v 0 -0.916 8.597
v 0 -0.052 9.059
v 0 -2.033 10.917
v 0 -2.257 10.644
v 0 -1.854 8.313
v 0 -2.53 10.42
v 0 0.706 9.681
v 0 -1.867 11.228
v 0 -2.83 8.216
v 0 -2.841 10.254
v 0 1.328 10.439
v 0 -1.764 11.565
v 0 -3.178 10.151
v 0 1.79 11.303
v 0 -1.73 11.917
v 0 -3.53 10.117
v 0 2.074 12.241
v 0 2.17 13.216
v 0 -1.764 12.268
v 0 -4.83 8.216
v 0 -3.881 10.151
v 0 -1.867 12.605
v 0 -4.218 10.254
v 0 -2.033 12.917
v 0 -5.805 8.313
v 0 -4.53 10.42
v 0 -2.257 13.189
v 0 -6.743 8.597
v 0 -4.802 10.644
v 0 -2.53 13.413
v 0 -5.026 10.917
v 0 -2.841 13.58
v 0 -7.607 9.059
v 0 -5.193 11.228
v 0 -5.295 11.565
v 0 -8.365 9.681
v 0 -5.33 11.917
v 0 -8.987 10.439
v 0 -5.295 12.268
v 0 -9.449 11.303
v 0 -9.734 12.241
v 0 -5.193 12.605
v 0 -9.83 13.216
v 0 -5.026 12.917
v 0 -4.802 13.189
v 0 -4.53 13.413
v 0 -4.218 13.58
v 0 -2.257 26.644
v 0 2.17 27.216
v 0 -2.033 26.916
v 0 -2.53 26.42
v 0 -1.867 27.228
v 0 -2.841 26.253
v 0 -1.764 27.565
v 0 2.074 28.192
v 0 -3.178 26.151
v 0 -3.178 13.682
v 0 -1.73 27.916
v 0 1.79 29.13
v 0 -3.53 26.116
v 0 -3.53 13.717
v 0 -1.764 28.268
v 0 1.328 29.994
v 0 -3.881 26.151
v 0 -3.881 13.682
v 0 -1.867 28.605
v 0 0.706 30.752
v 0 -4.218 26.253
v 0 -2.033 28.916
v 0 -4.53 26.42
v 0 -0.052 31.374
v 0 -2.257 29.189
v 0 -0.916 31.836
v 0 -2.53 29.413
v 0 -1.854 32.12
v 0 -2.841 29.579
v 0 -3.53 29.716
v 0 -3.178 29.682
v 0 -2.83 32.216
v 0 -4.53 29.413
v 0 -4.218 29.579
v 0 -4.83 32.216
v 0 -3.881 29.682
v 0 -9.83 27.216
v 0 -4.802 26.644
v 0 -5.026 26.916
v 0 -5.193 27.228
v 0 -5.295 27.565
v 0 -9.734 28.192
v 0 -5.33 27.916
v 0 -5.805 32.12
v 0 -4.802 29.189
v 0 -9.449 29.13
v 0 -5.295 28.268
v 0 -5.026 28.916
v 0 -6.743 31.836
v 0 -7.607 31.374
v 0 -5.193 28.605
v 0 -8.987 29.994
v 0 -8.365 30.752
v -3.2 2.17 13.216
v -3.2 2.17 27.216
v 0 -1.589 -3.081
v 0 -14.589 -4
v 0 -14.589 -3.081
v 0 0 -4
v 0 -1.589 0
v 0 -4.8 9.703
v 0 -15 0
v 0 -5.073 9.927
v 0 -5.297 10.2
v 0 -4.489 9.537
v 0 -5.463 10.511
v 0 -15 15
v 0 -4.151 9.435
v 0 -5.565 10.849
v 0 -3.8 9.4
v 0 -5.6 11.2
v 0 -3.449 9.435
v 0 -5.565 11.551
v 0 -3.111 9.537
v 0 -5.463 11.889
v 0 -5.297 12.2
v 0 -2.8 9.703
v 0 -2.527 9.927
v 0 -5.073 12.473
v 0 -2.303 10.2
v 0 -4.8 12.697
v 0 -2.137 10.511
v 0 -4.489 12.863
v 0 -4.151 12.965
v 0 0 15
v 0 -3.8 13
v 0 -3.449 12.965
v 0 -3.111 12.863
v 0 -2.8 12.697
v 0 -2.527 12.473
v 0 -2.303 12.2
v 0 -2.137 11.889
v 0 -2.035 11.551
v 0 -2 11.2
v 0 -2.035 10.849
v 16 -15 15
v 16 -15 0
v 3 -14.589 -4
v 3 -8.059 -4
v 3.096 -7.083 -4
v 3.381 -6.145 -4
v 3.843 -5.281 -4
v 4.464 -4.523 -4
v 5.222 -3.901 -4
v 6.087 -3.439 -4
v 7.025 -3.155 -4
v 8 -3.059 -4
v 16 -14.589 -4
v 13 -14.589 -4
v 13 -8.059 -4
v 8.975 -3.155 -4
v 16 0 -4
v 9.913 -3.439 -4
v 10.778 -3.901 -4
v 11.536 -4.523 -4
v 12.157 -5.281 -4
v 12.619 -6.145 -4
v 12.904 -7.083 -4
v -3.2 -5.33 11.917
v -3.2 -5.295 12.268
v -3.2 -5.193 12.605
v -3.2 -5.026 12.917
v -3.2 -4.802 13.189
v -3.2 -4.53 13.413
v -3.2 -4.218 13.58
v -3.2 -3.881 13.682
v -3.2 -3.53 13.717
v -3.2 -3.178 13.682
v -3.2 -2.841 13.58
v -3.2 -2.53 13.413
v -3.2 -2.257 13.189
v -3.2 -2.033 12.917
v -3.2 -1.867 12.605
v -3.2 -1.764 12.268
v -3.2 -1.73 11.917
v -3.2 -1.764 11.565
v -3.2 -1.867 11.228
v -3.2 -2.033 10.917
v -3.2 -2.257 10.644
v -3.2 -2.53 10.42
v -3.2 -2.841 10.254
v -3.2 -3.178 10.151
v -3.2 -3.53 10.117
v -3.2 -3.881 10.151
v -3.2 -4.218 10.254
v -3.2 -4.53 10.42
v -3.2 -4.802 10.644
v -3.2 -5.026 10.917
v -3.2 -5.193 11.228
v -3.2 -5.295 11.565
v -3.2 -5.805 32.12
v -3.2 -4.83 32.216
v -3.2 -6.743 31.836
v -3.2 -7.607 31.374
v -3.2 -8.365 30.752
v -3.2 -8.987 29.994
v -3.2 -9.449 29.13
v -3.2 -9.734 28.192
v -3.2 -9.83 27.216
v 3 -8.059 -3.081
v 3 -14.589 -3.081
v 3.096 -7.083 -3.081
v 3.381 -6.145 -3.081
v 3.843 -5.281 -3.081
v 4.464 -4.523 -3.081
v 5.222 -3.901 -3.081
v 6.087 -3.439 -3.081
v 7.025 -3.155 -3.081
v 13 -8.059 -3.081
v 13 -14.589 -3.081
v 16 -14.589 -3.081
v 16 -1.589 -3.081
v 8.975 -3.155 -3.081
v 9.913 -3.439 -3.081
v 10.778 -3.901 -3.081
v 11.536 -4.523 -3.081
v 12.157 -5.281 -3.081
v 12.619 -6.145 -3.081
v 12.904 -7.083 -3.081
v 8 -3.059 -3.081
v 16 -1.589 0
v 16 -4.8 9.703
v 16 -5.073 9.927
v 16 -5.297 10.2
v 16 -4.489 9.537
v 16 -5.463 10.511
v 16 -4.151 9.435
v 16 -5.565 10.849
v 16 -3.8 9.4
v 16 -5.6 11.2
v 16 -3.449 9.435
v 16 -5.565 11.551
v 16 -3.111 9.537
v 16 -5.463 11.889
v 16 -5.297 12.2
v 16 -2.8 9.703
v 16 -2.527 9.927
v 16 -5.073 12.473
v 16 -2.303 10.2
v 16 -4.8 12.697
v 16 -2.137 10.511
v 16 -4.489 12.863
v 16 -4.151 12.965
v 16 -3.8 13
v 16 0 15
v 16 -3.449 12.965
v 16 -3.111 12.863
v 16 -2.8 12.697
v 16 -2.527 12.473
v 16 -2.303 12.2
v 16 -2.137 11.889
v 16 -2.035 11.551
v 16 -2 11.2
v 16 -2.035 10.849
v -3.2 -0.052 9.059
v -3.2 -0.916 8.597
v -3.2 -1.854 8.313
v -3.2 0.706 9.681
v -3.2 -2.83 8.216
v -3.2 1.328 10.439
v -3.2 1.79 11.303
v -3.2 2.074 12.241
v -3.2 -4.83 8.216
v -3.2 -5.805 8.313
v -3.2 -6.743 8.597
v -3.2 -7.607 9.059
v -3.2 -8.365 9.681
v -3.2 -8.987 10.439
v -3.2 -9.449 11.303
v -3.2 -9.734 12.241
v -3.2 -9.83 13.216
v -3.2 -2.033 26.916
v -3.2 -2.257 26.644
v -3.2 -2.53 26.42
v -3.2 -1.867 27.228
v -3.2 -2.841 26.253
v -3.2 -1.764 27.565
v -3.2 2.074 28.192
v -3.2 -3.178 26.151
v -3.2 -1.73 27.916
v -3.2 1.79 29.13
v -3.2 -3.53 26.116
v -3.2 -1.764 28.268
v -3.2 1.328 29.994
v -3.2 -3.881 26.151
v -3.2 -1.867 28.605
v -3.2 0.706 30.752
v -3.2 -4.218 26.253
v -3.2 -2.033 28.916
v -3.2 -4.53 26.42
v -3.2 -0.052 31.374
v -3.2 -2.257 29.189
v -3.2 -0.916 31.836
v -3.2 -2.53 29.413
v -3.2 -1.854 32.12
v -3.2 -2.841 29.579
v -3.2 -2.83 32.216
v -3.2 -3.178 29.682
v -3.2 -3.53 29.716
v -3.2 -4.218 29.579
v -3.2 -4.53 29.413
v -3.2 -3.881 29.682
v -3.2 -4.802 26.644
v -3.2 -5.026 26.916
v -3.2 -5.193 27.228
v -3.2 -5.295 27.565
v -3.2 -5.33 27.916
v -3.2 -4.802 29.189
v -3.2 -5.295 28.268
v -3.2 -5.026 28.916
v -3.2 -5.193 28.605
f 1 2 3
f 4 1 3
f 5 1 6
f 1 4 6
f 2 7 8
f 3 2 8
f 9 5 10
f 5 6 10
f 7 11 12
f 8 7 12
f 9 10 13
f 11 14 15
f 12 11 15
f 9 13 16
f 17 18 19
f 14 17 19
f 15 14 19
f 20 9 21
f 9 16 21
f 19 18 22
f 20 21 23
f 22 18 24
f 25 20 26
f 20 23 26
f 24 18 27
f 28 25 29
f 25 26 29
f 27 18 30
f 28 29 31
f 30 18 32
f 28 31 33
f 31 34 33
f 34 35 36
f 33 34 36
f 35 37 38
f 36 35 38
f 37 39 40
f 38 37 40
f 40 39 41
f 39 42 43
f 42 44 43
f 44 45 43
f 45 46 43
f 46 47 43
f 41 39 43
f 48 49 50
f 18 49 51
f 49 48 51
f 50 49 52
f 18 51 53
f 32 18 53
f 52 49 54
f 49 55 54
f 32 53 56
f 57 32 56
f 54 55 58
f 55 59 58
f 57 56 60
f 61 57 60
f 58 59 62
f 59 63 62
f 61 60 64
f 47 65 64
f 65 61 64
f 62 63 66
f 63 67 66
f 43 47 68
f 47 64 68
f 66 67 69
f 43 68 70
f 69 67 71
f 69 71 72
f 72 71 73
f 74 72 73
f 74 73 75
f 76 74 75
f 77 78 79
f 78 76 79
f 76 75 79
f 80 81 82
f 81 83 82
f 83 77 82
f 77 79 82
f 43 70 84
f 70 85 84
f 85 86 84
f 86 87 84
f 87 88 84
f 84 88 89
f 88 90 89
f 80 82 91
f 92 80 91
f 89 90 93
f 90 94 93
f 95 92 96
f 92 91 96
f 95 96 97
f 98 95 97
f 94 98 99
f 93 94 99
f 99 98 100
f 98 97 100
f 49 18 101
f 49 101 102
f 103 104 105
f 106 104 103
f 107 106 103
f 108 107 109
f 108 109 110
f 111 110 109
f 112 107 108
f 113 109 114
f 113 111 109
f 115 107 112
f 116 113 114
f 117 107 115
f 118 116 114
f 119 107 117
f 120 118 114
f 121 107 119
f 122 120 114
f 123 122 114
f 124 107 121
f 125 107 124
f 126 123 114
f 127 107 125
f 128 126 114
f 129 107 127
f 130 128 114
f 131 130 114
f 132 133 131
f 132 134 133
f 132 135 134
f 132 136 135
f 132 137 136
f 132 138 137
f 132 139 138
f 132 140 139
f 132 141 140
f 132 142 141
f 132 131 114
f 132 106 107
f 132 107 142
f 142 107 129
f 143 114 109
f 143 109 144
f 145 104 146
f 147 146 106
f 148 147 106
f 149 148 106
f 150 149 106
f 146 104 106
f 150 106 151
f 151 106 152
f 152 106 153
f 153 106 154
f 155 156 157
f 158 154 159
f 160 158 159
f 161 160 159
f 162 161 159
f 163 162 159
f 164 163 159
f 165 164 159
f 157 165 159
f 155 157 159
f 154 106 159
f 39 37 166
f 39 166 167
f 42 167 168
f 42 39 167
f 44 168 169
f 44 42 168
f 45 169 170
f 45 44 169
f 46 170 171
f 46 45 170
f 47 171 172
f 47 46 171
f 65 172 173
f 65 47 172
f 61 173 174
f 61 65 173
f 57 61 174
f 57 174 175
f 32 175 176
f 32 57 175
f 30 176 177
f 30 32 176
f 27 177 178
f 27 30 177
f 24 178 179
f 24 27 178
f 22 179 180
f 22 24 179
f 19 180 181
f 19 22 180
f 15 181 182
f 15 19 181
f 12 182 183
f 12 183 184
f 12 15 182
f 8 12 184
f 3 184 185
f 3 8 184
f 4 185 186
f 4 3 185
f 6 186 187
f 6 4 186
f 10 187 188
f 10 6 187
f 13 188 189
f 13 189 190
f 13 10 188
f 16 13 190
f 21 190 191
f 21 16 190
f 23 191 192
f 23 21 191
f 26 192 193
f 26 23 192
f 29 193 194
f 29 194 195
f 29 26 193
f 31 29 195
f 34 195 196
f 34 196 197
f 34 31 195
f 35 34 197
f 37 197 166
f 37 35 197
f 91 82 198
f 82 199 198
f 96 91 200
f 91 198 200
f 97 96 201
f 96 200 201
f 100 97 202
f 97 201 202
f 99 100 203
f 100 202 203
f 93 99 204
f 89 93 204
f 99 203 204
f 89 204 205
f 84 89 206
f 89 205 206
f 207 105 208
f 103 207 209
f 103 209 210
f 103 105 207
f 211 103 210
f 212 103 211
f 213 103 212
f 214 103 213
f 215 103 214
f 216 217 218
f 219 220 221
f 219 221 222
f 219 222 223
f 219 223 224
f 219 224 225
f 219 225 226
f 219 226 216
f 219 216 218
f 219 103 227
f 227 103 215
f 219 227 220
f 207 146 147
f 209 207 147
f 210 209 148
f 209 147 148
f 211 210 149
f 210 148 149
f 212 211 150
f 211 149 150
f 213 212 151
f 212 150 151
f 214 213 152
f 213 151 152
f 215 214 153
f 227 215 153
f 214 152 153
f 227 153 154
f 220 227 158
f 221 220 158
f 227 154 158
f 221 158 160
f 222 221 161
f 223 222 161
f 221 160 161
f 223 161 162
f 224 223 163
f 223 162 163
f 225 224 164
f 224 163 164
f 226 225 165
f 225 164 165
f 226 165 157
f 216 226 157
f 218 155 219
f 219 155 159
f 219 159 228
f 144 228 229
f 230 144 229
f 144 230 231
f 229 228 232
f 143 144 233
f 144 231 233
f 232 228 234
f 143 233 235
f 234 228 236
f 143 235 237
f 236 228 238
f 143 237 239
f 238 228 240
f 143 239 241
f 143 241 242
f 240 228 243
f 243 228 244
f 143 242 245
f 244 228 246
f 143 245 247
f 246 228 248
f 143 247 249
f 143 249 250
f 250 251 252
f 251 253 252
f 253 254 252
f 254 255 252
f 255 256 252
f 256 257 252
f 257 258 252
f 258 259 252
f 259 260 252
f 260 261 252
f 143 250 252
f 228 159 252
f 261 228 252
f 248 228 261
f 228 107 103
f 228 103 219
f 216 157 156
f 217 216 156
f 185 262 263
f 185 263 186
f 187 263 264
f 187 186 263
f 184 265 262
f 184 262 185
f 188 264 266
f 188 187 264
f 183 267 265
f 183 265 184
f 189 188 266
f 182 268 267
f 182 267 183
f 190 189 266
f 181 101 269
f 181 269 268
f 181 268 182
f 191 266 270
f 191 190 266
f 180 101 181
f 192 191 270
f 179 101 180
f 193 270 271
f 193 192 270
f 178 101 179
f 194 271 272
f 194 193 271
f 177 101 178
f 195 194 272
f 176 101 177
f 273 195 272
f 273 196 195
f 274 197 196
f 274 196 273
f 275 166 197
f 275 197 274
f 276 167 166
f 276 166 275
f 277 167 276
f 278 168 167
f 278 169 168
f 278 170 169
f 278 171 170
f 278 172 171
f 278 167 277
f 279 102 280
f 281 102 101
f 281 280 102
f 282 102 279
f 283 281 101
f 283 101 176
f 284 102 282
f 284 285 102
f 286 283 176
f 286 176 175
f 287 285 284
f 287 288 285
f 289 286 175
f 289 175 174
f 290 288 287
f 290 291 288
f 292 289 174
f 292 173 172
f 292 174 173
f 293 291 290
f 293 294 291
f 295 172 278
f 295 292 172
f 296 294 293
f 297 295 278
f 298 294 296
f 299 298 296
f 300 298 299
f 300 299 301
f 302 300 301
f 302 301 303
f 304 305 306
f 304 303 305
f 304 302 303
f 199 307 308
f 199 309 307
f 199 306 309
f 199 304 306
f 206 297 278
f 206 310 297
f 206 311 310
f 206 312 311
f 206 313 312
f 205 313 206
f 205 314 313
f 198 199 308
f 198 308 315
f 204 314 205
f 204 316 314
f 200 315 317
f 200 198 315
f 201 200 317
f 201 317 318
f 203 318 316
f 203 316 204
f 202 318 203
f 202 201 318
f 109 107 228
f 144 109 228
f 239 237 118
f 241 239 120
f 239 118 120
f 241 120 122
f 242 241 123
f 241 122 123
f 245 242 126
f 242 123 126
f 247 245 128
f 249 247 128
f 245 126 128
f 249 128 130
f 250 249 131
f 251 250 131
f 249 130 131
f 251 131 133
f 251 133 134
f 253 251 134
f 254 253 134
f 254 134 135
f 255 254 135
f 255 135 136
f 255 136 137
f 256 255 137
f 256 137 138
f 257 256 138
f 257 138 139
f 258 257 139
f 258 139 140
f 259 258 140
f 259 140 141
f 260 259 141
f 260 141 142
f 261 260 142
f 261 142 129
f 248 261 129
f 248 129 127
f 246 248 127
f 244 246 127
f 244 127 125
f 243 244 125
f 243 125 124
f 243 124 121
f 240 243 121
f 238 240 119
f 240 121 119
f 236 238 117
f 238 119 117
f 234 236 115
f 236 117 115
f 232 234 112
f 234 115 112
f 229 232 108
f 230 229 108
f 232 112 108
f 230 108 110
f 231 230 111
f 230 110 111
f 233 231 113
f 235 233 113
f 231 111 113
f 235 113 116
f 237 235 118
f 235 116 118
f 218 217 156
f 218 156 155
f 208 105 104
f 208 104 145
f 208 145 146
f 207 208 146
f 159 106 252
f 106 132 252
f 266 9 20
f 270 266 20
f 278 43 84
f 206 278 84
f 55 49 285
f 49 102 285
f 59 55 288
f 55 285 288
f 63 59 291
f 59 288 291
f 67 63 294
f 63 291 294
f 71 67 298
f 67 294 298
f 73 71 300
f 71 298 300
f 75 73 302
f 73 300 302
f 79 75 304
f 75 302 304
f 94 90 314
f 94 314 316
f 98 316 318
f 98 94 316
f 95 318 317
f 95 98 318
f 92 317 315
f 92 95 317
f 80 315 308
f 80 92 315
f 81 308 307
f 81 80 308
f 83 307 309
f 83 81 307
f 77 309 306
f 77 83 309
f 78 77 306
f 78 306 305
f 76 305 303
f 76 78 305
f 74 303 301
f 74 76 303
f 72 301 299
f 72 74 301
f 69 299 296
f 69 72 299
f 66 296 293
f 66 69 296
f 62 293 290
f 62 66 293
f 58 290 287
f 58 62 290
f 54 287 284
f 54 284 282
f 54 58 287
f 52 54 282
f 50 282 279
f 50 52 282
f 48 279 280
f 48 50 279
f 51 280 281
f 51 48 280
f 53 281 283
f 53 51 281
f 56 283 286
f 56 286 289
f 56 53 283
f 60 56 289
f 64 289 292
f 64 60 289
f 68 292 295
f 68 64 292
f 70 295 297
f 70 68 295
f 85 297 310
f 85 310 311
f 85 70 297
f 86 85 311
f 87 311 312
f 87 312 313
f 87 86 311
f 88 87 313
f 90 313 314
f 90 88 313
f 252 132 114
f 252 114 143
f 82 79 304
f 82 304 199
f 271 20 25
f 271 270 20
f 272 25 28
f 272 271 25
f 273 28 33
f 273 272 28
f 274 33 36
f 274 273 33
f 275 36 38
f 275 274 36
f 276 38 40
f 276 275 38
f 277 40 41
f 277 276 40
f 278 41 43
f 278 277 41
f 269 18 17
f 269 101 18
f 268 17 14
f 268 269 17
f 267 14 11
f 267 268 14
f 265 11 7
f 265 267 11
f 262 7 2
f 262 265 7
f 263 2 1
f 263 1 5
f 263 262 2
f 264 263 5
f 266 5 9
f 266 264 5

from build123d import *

# Parameters (mm, degrees)
F0_W      = 16
F0_H      = 15
F1_DEPTH  = 15
F2_R      = 1.8
F3_DEPTH  = 25
F4_W      = 12
F4_H      = 24
F4_R      = 1.8
F5_DEPTH  = 3.2
F6_R      = 5
F7_W      = 16
F7_H      = 1.589112
F8_DEPTH  = 4
F9_W      = 16
F9_H      = 0.918874
F10_DEPTH = 13
F12_DEPTH = 2


with BuildPart() as f1:
    # F0 (on Front) → F1 (new body)
    with BuildSketch(Plane.XZ):
        with Locations((8, 7.5)):
            Rectangle(F0_W, F0_H)
    extrude(amount=F1_DEPTH)

    # F2 (on face) → F3 (cut)
    with BuildSketch(Plane(origin=(0, 0, 0), x_dir=(0, -1, 0), z_dir=(-1, 0, 0))):
        with Locations((3.8, 11.2)):
            Circle(F2_R)
    extrude(amount=-F3_DEPTH, mode=Mode.SUBTRACT)

    # F7 (on face) → F8 (join)
    with BuildSketch(Plane(origin=(0, 0, 0), x_dir=(1, 0, 0), z_dir=(0, 0, -1))):
        with Locations((8, 0.794556)):
            Rectangle(F7_W, F7_H)
    extrude(amount=F8_DEPTH)

    # F9 (on face) → F10 (join)
    with BuildSketch(Plane.XZ.offset(1.589112)):
        with Locations((8, -3.540563)):
            Rectangle(F9_W, F9_H)
    extrude(amount=F10_DEPTH)

    # F11 (on face) → F12 (cut)
    with BuildSketch(Plane(origin=(0, 0, -4), x_dir=(1, 0, 0), z_dir=(0, 0, -1))):
        with BuildLine():
            Line((13, 14.589112), (3, 14.589112))
            Line((3, 14.589112), (3, 8.058546))
            ThreePointArc((3, 8.058546), (8, 3.058546), (13, 8.058546))
            Line((13, 8.058546), (13, 14.589112))
        make_face()
    extrude(amount=-F12_DEPTH, mode=Mode.SUBTRACT)


with BuildPart() as f5:
    # F4 (on face) → F5 (new body)
    with BuildSketch(Plane(origin=(0, 0, 0), x_dir=(0, -1, 0), z_dir=(-1, 0, 0))):
        with Locations((3.829613, 20.216454)):
            Rectangle(F4_W, F4_H)
        with Locations((3.529613, 11.916554)):
            Circle(F4_R, mode=Mode.SUBTRACT)
        with Locations((3.529613, 27.916454)):
            Circle(F4_R, mode=Mode.SUBTRACT)
    extrude(amount=F5_DEPTH)

    # F6
    f6_edges = [f5.edges().sort_by_distance(p)[0] for p in [
        (-1.6, 2.170387, 32.216454),
        (-1.6, -9.829613, 32.216454),
        (-1.6, -9.829613, 8.216454),
        (-1.6, 2.170387, 8.216454),
    ]]
    fillet(f6_edges, radius=F6_R)


solid = Compound([f1.part, f5.part])
